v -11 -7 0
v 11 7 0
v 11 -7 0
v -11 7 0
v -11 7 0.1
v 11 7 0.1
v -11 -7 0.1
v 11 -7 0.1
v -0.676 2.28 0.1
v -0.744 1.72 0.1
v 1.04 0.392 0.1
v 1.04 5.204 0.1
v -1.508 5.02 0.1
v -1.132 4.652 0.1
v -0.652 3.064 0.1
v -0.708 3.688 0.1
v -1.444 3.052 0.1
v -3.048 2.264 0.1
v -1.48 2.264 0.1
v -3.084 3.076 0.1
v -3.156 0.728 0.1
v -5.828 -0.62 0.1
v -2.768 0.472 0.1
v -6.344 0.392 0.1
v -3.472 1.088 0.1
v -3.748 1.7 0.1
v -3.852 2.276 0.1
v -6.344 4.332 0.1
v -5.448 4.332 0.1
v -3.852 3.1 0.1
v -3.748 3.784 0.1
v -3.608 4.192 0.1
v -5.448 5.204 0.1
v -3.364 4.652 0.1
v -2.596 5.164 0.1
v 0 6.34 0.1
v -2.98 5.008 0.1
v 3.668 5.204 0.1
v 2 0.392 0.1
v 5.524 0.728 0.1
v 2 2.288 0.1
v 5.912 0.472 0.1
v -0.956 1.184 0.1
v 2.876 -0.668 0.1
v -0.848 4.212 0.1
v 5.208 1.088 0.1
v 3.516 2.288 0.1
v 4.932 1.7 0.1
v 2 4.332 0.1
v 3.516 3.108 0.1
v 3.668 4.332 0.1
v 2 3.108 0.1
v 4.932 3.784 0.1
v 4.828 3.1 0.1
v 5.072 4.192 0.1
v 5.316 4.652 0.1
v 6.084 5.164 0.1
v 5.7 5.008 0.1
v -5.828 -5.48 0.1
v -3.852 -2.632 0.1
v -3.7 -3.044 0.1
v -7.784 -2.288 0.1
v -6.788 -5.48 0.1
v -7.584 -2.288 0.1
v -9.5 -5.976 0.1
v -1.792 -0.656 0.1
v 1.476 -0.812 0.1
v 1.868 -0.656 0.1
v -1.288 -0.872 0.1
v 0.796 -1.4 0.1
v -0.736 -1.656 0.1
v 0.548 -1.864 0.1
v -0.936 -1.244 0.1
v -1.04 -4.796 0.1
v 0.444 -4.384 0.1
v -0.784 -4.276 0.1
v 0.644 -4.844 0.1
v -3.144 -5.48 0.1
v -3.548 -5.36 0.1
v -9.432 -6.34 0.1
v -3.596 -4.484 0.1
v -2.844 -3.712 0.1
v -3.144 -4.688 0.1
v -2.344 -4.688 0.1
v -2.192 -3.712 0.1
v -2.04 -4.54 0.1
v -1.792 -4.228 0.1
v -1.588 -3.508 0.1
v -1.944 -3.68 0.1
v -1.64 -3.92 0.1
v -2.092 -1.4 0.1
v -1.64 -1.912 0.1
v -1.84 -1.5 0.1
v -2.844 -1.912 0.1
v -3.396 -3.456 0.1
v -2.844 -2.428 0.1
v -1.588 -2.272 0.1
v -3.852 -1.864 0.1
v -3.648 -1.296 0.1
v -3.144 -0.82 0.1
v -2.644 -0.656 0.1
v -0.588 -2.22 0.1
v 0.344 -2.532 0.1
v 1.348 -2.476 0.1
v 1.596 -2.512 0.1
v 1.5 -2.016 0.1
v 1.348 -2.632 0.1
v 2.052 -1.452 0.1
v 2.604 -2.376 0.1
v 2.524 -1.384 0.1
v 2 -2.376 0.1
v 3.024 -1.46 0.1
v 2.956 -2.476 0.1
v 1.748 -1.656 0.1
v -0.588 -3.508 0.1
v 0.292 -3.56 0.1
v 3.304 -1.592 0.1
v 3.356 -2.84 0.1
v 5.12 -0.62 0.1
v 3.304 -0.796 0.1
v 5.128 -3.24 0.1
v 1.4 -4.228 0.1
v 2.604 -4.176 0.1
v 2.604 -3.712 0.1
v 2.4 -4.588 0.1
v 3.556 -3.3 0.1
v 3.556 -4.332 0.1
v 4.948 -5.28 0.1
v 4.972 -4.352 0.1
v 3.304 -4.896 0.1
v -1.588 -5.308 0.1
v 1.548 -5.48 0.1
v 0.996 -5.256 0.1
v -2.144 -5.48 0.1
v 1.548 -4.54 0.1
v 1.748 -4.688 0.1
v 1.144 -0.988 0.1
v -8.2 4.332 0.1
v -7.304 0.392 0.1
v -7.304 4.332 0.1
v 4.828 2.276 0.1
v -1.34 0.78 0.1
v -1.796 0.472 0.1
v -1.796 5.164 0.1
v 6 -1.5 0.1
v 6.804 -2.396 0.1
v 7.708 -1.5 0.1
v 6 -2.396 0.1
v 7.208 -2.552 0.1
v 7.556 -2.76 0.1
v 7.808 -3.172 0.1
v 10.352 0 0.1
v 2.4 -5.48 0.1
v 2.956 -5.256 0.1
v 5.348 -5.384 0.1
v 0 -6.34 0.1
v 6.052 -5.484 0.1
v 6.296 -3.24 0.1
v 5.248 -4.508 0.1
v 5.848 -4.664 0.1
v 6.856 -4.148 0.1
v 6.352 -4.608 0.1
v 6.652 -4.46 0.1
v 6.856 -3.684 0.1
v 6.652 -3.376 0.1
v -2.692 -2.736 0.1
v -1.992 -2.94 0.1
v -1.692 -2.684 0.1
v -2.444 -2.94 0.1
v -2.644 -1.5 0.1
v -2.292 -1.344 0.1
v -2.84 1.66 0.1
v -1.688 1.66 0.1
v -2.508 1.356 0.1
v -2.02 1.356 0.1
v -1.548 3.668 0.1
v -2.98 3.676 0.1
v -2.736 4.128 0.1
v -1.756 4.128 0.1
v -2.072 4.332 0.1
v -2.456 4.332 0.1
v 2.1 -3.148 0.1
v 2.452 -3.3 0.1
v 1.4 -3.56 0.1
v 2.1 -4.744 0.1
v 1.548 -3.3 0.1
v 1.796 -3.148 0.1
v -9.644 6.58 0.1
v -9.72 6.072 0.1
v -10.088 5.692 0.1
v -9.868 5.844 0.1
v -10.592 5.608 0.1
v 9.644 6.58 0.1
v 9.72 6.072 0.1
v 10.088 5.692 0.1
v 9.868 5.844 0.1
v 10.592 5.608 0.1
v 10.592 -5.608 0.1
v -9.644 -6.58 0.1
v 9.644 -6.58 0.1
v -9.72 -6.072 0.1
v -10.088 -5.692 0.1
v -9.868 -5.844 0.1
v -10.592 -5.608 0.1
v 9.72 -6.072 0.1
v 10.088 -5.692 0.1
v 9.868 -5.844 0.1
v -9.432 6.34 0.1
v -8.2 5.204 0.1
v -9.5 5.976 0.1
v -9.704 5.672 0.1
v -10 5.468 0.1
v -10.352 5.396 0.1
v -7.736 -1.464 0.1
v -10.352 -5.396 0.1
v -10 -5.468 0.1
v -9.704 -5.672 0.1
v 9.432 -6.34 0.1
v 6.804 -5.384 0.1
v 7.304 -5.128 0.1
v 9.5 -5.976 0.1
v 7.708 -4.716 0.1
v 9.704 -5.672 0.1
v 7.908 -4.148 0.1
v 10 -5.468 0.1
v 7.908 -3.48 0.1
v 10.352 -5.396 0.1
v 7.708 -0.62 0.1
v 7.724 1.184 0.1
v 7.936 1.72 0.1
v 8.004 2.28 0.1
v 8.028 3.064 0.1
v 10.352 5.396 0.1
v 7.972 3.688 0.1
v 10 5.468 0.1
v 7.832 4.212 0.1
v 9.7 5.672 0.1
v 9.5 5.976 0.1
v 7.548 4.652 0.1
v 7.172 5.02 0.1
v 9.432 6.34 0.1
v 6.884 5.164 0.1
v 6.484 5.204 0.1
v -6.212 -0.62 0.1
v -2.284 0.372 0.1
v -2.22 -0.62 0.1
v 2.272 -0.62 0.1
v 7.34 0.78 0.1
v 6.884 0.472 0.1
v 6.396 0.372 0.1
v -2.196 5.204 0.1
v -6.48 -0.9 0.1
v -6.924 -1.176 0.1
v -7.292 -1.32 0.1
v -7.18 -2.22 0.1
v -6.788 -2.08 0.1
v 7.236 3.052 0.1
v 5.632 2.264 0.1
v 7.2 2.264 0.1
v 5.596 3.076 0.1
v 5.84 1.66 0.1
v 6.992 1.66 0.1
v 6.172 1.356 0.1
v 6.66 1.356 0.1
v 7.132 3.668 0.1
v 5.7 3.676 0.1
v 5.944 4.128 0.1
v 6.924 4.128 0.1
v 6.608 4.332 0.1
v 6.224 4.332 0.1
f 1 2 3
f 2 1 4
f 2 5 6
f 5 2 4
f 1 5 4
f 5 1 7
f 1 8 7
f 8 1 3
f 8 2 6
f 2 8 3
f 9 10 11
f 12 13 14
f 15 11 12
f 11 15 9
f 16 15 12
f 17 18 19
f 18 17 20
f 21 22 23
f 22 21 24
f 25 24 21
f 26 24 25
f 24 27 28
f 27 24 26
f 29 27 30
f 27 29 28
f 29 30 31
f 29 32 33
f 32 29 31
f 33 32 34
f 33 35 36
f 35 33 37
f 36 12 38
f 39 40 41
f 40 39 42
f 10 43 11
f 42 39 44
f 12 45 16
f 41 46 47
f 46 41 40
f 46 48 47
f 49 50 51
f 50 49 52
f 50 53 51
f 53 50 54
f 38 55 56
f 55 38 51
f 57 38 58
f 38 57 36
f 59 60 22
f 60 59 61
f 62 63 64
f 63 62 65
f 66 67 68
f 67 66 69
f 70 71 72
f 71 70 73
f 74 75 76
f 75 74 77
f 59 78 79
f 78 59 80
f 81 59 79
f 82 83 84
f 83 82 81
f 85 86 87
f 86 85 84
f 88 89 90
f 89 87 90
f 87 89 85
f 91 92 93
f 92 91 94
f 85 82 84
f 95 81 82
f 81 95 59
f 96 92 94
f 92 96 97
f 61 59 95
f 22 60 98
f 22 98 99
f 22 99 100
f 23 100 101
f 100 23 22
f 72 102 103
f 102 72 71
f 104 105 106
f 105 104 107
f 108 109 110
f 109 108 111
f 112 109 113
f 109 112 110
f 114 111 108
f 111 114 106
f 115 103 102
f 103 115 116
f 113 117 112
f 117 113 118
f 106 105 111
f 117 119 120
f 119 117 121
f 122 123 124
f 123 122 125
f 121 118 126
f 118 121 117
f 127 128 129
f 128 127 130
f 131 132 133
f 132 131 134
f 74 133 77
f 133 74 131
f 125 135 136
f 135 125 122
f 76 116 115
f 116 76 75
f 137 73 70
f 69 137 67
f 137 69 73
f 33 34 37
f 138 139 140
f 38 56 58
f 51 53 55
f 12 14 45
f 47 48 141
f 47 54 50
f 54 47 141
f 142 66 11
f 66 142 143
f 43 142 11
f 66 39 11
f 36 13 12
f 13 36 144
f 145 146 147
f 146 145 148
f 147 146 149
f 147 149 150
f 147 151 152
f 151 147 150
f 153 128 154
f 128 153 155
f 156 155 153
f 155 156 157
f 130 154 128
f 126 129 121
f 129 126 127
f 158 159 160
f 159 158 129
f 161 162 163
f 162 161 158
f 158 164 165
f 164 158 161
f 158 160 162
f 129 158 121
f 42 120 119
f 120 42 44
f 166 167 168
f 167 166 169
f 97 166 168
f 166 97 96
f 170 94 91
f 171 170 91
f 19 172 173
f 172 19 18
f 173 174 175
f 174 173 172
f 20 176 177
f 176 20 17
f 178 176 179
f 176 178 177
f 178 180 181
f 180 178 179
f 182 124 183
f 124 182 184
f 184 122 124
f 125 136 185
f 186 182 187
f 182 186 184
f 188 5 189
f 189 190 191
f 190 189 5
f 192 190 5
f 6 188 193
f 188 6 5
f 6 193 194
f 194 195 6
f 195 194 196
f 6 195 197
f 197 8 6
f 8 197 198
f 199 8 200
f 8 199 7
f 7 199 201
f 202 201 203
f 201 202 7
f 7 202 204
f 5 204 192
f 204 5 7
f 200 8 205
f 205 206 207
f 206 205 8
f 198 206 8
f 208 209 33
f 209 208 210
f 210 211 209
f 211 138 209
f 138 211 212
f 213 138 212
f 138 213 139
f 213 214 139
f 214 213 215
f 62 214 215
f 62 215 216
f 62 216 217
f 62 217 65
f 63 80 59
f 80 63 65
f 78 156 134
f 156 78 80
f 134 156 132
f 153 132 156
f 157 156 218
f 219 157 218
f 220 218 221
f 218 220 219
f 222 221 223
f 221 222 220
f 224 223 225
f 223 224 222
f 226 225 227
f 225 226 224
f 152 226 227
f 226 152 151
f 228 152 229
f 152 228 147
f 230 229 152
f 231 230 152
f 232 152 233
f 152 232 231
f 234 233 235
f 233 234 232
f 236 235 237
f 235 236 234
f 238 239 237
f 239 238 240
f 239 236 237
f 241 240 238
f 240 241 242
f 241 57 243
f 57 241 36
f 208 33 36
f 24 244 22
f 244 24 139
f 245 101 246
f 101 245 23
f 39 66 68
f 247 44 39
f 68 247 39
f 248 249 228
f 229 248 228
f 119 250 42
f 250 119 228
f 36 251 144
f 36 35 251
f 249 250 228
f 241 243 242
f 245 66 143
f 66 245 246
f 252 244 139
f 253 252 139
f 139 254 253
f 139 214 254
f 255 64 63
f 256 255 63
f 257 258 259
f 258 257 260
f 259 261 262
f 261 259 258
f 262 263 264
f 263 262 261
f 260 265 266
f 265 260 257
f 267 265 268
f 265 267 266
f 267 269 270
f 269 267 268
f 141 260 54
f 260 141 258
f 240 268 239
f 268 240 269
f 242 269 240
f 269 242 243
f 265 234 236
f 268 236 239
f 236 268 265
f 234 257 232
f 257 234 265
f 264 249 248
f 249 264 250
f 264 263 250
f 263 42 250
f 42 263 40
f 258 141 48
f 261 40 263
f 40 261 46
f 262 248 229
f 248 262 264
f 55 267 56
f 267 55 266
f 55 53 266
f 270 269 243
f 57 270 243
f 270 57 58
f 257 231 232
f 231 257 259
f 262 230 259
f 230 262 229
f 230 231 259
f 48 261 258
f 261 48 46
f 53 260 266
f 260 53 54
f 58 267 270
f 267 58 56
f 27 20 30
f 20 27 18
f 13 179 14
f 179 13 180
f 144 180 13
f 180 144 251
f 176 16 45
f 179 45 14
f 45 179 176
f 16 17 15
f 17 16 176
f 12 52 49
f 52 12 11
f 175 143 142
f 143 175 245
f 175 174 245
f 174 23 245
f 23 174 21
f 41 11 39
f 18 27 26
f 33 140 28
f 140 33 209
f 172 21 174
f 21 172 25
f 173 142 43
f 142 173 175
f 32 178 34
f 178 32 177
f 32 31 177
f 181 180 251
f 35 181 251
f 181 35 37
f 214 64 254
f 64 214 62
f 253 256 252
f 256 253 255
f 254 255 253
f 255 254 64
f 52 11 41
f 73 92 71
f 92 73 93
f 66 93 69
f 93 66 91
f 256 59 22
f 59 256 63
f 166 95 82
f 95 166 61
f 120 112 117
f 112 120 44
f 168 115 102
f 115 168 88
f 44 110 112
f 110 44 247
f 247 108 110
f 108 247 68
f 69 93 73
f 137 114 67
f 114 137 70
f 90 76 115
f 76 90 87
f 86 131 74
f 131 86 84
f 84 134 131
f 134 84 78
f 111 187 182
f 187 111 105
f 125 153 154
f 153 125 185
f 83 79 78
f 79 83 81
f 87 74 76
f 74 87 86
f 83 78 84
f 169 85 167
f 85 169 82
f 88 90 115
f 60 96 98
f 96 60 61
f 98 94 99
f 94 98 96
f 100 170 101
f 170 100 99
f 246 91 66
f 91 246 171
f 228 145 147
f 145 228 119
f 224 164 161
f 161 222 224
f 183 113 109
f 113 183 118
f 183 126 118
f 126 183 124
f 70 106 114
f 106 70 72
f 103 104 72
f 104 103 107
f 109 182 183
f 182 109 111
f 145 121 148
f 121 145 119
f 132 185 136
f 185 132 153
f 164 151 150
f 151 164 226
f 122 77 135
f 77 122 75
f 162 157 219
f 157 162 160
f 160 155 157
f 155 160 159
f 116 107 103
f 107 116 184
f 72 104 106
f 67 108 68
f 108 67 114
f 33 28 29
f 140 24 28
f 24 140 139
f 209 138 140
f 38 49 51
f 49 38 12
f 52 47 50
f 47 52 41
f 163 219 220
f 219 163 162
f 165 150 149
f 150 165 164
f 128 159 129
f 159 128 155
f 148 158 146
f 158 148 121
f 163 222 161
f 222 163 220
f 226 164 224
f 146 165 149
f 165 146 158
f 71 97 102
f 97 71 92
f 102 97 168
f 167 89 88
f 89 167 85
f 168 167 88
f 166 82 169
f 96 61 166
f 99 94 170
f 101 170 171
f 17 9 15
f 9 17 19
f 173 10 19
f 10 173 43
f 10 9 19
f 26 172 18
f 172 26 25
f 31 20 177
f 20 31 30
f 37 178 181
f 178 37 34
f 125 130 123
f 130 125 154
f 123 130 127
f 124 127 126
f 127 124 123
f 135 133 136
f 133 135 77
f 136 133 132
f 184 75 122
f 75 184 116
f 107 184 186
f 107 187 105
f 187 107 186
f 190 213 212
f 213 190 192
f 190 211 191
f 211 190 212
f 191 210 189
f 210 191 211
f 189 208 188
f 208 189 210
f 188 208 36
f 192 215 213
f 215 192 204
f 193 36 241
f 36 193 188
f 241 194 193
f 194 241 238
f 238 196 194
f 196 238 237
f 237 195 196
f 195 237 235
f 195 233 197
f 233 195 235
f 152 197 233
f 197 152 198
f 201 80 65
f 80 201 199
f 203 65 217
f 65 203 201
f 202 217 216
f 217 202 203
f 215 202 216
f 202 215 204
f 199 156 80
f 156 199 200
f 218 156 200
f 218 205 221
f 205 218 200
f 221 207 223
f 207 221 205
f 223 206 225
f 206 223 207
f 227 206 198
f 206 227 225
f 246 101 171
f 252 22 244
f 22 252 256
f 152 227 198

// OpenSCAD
// file: ../p/box5-12.scad
use <../lib.scad>
function ldraw_lib__box5_12() = [
// 0 Box with 5 Faces without Any Edges
// 0 Name: box5-12.dat
// 0 Author: Chris Dee [cwdee]
// 0 !LDRAW_ORG Primitive UPDATE 2009-02
// 0 !LICENSE Licensed under CC BY 4.0 : see CAreadme.txt
// 
// 0 BFC CERTIFY CCW
  [0,"BFC","CERTIFY"],
  [0,"BFC","CCW"],
// 
// 0 !HISTORY 2009-09-03 [PTadmin] Official Update 2009-02
// 
// 
// 4 16 1 1 1 1 1 -1 -1 1 -1 -1 1 1
  [4,16,1,1,1,1,1,-1,-1,1,-1,-1,1,1],
// 4 16 -1 0 1 1 0 1 1 1 1 -1 1 1
  [4,16,-1,0,1,1,0,1,1,1,1,-1,1,1],
// 4 16 -1 0 -1 -1 0 1 -1 1 1 -1 1 -1
  [4,16,-1,0,-1,-1,0,1,-1,1,1,-1,1,-1],
// 4 16 1 0 -1 -1 0 -1 -1 1 -1 1 1 -1
  [4,16,1,0,-1,-1,0,-1,-1,1,-1,1,1,-1],
// 4 16 1 0 1 1 0 -1 1 1 -1 1 1 1
  [4,16,1,0,1,1,0,-1,1,1,-1,1,1,1],
// 0
];
module ldraw_lib__box5_12(step=0, col=false, unit=2/5, alt=false, line=0.2, solid=!$preview)
    makepoly(ldraw_lib__box5_12(), step=step, col=col, unit=unit, alt=alt, line=line, solid=solid);
ldraw_lib__box5_12(line=0.2);
// main file
use <../lib.scad>
use <6296256m.scad>
function ldraw_lib__6372023m() = [
// 0 =Sticker  1.8 x  2.8 with "TOFO 1965" Licence Plate
// 0 Name: 6372023m.dat
// 0 Author: Magnus Forsberg [MagFors]
// 0 !LDRAW_ORG Part Alias UPDATE 2024-01
// 0 !LICENSE Licensed under CC BY 4.0 : see CAreadme.txt
// 
// 0 BFC CERTIFY CCW
  [0,"BFC","CERTIFY"],
  [0,"BFC","CCW"],
// 
// 0 !KEYWORDS 500, Cinquecento, FIAT, Nuova, set 77942
// 
// 0 !HISTORY 2024-01-29 [OrionP] Official Update 2024-01
// 
// 
// 1 16 0 0 0 1 0 0 0 1 0 0 0 1 6296256m.dat
  [1,16,0,0,0,1,0,0,0,1,0,0,0,1, ldraw_lib__6296256m()],
];
module ldraw_lib__6372023m(step=0, col=false, unit=2/5, alt=false, line=0.2, solid=!$preview)
    makepoly(ldraw_lib__6372023m(), step=step, col=col, unit=unit, alt=alt, line=line, solid=solid);
ldraw_lib__6372023m(line=0.2);
